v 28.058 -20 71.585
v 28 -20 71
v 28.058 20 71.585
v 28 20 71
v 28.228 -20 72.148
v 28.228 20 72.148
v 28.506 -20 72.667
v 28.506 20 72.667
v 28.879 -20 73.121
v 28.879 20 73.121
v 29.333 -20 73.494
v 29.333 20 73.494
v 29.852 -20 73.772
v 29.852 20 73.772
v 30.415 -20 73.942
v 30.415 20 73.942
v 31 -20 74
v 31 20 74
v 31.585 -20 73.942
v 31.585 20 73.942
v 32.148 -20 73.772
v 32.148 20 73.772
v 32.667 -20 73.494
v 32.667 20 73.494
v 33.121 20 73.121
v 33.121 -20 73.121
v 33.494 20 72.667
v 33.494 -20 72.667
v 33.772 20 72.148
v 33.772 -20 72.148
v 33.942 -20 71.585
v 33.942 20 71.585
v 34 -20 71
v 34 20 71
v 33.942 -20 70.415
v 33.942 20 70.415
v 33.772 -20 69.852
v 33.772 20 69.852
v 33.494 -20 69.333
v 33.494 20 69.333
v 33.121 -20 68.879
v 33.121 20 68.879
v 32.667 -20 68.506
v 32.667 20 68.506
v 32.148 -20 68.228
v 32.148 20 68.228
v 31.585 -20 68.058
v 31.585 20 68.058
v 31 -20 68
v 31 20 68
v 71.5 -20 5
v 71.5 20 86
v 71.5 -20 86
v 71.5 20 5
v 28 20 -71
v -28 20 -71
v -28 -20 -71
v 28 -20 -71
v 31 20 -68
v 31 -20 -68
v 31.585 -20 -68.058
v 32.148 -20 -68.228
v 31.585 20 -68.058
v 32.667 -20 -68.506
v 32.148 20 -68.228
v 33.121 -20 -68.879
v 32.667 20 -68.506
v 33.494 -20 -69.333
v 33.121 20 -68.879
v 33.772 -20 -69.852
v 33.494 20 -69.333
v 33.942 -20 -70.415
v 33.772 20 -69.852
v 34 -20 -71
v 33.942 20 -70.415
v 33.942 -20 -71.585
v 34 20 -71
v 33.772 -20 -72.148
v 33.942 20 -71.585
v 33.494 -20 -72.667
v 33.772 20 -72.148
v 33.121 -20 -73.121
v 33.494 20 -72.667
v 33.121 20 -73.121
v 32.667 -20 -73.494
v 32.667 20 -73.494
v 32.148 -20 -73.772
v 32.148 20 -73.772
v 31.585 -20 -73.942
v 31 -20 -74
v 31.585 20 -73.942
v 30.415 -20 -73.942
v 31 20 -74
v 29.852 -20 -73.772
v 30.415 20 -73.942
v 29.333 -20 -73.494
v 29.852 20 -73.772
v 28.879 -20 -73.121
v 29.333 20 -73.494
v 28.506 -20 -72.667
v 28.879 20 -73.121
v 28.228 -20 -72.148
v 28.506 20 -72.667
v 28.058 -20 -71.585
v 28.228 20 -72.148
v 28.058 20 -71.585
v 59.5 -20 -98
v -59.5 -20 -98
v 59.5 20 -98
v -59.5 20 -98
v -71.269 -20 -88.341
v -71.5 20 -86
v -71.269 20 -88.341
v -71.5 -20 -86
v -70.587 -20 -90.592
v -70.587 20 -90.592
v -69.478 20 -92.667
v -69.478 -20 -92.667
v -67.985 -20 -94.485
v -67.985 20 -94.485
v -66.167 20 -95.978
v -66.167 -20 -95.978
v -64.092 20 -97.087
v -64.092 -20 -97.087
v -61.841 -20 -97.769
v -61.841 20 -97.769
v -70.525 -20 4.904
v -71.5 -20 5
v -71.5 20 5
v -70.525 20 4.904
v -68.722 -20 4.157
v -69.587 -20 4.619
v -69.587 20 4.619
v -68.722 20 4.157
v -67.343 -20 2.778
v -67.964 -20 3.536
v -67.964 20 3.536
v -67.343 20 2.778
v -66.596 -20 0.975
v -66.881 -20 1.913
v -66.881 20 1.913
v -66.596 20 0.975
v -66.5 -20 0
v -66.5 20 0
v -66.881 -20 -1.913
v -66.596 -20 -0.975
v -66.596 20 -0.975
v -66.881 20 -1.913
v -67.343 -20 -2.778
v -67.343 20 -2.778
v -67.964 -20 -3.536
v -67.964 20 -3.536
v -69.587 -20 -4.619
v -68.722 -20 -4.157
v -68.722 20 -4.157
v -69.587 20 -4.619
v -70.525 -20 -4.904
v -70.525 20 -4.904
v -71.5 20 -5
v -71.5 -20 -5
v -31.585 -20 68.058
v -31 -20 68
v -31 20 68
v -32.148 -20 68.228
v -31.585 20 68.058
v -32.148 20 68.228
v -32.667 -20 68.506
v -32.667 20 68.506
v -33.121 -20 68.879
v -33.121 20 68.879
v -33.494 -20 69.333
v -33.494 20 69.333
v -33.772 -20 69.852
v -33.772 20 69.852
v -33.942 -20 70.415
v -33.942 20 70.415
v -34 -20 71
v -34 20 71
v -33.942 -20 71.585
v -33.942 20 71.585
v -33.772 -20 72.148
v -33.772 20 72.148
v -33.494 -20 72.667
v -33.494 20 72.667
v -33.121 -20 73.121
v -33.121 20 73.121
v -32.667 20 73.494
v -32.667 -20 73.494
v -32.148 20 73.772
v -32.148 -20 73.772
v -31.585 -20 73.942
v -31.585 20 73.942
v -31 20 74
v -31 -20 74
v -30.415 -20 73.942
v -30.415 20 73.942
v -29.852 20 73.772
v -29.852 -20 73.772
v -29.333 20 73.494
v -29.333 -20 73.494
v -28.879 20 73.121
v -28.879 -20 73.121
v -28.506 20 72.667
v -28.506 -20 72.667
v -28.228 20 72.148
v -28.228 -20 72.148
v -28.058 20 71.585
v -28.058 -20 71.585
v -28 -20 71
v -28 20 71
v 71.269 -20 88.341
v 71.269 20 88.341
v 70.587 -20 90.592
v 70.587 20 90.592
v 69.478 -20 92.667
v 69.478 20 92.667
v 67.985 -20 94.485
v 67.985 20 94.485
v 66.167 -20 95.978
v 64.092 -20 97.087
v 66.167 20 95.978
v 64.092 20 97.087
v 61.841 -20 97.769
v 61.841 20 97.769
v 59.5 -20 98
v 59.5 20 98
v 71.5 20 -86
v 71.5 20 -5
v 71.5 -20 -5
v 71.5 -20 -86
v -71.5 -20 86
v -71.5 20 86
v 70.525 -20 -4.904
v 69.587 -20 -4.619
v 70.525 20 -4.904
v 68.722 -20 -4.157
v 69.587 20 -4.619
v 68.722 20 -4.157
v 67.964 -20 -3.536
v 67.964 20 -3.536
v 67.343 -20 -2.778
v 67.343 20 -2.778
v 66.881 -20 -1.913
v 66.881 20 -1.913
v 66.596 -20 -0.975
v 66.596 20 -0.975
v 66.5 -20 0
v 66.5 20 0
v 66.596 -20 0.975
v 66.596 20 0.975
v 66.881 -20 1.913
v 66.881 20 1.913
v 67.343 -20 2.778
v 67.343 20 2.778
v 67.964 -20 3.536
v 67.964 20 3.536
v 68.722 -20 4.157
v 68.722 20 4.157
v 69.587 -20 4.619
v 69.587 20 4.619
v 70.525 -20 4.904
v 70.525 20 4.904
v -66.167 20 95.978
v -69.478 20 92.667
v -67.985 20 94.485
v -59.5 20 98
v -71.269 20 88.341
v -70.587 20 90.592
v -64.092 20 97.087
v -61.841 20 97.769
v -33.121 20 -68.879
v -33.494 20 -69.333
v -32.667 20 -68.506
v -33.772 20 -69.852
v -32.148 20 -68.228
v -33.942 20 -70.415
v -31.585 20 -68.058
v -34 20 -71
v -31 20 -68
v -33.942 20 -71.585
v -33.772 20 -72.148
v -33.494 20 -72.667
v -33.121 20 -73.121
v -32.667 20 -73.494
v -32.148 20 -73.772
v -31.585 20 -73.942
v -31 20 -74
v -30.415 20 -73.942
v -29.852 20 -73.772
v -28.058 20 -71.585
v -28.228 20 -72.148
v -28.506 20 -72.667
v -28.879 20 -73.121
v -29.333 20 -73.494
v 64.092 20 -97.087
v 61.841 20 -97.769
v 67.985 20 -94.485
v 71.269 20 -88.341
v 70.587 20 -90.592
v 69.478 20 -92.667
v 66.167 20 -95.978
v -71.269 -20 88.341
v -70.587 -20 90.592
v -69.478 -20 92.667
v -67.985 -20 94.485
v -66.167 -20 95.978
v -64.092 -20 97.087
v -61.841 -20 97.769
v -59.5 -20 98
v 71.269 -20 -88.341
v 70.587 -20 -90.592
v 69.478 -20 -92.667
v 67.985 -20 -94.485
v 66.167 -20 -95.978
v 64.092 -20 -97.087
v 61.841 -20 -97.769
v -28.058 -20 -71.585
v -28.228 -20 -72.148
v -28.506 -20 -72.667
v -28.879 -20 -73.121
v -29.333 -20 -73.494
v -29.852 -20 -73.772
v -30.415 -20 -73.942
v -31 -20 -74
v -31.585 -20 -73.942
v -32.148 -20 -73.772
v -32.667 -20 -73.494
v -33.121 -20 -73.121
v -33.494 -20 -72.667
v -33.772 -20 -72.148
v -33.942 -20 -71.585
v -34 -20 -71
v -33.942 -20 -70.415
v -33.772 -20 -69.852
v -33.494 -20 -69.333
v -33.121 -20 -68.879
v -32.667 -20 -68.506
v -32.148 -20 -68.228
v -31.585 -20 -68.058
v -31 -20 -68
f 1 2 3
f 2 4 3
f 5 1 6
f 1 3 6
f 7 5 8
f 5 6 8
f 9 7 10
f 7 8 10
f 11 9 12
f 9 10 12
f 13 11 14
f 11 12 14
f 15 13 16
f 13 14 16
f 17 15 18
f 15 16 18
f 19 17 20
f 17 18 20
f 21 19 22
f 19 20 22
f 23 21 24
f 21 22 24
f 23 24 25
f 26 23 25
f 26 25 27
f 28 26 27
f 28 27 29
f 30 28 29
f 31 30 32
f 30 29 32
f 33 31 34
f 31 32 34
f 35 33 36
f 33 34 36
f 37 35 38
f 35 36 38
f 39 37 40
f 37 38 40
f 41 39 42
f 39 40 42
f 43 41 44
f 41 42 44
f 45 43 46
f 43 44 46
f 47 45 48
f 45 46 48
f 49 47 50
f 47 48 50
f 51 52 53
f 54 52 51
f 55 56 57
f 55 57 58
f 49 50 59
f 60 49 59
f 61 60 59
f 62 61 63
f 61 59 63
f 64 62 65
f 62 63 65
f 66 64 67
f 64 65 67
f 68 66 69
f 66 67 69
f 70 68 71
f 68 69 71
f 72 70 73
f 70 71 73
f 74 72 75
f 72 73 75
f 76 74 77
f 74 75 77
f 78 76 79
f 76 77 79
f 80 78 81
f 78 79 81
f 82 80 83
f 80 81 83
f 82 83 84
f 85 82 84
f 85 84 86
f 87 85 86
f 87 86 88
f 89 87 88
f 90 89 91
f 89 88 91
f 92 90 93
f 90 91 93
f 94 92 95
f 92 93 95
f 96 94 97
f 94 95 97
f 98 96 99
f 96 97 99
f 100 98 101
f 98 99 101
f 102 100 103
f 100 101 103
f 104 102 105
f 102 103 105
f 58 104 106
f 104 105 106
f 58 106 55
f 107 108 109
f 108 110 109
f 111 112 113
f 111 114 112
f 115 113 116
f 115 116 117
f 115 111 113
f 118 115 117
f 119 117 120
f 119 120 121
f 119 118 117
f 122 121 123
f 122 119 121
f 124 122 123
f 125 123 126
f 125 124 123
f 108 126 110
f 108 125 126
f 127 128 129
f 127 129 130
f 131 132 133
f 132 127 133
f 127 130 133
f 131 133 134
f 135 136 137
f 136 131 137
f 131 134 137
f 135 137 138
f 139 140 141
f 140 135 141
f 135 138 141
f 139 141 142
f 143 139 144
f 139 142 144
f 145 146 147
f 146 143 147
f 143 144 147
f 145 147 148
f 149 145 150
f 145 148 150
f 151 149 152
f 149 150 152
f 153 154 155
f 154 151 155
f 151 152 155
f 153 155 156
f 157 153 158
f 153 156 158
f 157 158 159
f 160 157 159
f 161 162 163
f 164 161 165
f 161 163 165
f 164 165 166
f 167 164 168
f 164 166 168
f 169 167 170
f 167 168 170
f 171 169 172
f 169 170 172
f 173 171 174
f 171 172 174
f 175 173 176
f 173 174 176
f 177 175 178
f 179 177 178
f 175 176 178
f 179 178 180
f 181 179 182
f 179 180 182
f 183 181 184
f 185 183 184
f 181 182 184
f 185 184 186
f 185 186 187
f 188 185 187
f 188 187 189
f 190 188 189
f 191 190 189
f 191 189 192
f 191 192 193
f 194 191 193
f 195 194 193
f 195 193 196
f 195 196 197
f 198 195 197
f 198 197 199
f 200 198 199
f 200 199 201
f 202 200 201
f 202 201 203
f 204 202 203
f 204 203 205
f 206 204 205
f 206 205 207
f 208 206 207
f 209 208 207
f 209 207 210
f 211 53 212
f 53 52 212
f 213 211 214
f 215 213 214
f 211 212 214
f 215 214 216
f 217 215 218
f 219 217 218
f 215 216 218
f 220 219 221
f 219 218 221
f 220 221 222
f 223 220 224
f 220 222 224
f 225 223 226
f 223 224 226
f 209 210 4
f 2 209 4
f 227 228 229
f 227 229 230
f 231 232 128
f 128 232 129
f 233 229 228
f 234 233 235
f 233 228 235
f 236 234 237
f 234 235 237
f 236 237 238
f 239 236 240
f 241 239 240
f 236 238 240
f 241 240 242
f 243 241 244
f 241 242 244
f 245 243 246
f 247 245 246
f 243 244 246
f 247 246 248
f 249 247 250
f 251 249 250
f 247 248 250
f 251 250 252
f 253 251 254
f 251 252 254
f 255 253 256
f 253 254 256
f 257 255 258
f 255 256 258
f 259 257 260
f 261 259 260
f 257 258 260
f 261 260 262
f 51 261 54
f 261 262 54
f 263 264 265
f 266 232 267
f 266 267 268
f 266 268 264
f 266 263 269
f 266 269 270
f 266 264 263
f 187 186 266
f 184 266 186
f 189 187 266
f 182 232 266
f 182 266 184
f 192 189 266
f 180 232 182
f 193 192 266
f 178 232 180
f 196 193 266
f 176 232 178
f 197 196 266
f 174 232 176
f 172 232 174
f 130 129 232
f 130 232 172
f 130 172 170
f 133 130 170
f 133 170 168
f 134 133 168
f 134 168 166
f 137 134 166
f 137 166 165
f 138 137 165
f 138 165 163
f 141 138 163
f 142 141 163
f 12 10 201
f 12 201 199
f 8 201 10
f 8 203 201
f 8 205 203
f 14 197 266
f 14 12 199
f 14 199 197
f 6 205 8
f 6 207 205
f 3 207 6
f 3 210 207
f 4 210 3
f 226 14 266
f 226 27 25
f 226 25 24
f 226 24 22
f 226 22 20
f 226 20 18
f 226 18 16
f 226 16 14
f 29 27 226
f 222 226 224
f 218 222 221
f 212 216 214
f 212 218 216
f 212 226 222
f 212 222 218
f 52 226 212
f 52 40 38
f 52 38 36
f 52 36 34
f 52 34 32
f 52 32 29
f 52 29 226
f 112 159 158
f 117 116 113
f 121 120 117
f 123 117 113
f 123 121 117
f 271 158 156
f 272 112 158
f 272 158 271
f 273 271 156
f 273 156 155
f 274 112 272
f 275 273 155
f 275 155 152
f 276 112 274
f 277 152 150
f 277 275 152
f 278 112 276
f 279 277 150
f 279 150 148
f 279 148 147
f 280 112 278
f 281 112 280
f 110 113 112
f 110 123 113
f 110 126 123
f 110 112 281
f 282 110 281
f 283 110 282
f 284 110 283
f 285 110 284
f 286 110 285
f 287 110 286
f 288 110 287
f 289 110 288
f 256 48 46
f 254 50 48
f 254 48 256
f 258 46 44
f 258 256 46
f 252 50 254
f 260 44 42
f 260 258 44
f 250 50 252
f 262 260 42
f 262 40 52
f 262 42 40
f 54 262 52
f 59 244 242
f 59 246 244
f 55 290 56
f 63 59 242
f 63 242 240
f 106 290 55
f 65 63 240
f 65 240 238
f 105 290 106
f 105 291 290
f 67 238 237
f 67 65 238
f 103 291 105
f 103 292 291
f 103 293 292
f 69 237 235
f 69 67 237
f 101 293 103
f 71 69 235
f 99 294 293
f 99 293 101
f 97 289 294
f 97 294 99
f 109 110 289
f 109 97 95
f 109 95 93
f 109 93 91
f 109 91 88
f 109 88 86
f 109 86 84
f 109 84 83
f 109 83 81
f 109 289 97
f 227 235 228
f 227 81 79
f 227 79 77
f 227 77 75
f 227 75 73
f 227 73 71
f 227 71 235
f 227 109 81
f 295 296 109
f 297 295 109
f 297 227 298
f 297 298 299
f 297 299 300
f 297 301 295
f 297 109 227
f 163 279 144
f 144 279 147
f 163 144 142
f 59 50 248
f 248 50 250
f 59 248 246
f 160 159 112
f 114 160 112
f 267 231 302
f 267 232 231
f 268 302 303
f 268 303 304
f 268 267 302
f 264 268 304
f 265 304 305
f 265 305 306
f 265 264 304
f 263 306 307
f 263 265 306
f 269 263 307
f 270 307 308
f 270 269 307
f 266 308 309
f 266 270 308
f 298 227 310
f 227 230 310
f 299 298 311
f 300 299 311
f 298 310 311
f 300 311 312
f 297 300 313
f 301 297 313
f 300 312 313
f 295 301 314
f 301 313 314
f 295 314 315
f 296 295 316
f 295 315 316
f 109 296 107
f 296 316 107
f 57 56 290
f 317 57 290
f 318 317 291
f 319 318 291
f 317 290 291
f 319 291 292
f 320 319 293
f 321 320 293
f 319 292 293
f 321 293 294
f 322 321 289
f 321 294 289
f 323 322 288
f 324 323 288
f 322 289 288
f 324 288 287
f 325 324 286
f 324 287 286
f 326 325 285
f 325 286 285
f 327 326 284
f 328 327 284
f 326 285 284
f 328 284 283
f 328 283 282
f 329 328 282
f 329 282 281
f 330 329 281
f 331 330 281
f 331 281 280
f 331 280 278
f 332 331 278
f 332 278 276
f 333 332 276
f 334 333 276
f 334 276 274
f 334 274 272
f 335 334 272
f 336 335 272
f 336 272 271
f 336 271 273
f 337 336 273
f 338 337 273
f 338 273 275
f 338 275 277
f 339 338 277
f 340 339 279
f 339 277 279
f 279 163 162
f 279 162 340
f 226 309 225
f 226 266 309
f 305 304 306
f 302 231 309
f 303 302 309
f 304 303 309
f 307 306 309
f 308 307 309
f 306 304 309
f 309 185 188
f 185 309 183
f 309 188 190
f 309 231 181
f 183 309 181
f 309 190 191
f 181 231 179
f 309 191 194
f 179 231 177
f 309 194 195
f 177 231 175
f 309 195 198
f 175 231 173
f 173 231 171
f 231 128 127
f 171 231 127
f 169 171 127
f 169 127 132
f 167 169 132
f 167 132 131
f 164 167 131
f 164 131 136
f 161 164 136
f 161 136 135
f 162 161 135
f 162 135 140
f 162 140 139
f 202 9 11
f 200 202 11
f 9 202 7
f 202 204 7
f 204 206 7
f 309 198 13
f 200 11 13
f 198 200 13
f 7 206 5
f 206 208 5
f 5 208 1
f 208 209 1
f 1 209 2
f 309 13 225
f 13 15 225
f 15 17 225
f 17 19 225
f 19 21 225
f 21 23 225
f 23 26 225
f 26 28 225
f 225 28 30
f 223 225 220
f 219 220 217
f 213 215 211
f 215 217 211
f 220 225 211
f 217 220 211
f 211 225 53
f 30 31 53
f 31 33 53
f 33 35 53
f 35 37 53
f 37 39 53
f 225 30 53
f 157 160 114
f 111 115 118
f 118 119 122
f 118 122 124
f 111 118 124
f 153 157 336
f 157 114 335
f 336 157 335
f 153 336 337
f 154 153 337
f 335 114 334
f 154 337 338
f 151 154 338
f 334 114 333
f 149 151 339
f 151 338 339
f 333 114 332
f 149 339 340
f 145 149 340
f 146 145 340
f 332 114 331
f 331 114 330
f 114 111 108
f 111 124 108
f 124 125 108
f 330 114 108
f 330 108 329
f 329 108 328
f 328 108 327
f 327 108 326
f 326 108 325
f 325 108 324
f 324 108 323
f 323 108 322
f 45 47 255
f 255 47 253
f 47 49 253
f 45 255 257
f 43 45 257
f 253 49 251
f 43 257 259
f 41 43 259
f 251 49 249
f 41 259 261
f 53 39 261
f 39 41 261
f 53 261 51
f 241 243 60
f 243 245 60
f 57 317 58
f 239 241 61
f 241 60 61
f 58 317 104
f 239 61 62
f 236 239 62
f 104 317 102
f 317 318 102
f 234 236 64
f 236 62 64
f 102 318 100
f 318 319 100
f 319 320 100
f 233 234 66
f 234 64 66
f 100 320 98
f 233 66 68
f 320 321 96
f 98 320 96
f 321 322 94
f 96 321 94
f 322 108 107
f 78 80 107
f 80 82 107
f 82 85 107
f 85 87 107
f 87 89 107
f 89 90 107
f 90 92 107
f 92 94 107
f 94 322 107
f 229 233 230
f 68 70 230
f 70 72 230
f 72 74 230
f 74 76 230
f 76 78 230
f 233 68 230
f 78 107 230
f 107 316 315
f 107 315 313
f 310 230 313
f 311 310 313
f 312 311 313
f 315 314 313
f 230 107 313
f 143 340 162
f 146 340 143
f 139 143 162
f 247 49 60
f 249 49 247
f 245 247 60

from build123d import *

# Parameters (mm, degrees)
SKETCH_1_W          = 143
SKETCH_1_H          = 196
SKETCH_1_W_2        = 62
SKETCH_1_H_2        = 142
EXTRUDE_1_DEPTH     = 20
FILLET_1_R          = 12
SKETCH_2_R          = 3
CUT_EXTRUDE_1_DEPTH = 40
SKETCH_3_R          = 5
CUT_EXTRUDE_2_DEPTH = 40


with BuildPart() as part:
    # 草图1 → 凸台-拉伸1 (new, symmetric)
    with BuildSketch(Plane(origin=(0, 0, 0), x_dir=(1, 0, 0), z_dir=(0, 1, 0))):
        Rectangle(SKETCH_1_W, SKETCH_1_H)
        Rectangle(SKETCH_1_W_2, SKETCH_1_H_2, mode=Mode.SUBTRACT)
    extrude(amount=EXTRUDE_1_DEPTH, both=True)

    # 圆角1
    fillet_1_edges = [part.edges().sort_by_distance(p)[0] for p in [
        (-71.5, 0, -98),
        (71.5, 0, -98),
        (71.5, 0, 98),
        (-71.5, 0, 98),
    ]]
    fillet(fillet_1_edges, radius=FILLET_1_R)

    # 草图2 → 切除-拉伸1 (cut)
    with BuildSketch(Plane(origin=(0, 20, 0), x_dir=(1, 0, 0), z_dir=(0, 1, 0))):
        with Locations((-31, 71)):
            Circle(SKETCH_2_R)
        with Locations((31, 71)):
            Circle(SKETCH_2_R)
        with Locations((31, -71)):
            Circle(SKETCH_2_R)
        with Locations((-31, -71)):
            Circle(SKETCH_2_R)
    extrude(amount=-CUT_EXTRUDE_1_DEPTH, mode=Mode.SUBTRACT)

    # 草图3 → 切除-拉伸2 (cut)
    with BuildSketch(Plane(origin=(0, 20, 0), x_dir=(1, 0, 0), z_dir=(0, 1, 0))):
        with Locations((-71.5, 0)):
            Circle(SKETCH_3_R)
        with Locations((71.5, 0)):
            Circle(SKETCH_3_R)
    extrude(amount=-CUT_EXTRUDE_2_DEPTH, mode=Mode.SUBTRACT)


solid = part.part
